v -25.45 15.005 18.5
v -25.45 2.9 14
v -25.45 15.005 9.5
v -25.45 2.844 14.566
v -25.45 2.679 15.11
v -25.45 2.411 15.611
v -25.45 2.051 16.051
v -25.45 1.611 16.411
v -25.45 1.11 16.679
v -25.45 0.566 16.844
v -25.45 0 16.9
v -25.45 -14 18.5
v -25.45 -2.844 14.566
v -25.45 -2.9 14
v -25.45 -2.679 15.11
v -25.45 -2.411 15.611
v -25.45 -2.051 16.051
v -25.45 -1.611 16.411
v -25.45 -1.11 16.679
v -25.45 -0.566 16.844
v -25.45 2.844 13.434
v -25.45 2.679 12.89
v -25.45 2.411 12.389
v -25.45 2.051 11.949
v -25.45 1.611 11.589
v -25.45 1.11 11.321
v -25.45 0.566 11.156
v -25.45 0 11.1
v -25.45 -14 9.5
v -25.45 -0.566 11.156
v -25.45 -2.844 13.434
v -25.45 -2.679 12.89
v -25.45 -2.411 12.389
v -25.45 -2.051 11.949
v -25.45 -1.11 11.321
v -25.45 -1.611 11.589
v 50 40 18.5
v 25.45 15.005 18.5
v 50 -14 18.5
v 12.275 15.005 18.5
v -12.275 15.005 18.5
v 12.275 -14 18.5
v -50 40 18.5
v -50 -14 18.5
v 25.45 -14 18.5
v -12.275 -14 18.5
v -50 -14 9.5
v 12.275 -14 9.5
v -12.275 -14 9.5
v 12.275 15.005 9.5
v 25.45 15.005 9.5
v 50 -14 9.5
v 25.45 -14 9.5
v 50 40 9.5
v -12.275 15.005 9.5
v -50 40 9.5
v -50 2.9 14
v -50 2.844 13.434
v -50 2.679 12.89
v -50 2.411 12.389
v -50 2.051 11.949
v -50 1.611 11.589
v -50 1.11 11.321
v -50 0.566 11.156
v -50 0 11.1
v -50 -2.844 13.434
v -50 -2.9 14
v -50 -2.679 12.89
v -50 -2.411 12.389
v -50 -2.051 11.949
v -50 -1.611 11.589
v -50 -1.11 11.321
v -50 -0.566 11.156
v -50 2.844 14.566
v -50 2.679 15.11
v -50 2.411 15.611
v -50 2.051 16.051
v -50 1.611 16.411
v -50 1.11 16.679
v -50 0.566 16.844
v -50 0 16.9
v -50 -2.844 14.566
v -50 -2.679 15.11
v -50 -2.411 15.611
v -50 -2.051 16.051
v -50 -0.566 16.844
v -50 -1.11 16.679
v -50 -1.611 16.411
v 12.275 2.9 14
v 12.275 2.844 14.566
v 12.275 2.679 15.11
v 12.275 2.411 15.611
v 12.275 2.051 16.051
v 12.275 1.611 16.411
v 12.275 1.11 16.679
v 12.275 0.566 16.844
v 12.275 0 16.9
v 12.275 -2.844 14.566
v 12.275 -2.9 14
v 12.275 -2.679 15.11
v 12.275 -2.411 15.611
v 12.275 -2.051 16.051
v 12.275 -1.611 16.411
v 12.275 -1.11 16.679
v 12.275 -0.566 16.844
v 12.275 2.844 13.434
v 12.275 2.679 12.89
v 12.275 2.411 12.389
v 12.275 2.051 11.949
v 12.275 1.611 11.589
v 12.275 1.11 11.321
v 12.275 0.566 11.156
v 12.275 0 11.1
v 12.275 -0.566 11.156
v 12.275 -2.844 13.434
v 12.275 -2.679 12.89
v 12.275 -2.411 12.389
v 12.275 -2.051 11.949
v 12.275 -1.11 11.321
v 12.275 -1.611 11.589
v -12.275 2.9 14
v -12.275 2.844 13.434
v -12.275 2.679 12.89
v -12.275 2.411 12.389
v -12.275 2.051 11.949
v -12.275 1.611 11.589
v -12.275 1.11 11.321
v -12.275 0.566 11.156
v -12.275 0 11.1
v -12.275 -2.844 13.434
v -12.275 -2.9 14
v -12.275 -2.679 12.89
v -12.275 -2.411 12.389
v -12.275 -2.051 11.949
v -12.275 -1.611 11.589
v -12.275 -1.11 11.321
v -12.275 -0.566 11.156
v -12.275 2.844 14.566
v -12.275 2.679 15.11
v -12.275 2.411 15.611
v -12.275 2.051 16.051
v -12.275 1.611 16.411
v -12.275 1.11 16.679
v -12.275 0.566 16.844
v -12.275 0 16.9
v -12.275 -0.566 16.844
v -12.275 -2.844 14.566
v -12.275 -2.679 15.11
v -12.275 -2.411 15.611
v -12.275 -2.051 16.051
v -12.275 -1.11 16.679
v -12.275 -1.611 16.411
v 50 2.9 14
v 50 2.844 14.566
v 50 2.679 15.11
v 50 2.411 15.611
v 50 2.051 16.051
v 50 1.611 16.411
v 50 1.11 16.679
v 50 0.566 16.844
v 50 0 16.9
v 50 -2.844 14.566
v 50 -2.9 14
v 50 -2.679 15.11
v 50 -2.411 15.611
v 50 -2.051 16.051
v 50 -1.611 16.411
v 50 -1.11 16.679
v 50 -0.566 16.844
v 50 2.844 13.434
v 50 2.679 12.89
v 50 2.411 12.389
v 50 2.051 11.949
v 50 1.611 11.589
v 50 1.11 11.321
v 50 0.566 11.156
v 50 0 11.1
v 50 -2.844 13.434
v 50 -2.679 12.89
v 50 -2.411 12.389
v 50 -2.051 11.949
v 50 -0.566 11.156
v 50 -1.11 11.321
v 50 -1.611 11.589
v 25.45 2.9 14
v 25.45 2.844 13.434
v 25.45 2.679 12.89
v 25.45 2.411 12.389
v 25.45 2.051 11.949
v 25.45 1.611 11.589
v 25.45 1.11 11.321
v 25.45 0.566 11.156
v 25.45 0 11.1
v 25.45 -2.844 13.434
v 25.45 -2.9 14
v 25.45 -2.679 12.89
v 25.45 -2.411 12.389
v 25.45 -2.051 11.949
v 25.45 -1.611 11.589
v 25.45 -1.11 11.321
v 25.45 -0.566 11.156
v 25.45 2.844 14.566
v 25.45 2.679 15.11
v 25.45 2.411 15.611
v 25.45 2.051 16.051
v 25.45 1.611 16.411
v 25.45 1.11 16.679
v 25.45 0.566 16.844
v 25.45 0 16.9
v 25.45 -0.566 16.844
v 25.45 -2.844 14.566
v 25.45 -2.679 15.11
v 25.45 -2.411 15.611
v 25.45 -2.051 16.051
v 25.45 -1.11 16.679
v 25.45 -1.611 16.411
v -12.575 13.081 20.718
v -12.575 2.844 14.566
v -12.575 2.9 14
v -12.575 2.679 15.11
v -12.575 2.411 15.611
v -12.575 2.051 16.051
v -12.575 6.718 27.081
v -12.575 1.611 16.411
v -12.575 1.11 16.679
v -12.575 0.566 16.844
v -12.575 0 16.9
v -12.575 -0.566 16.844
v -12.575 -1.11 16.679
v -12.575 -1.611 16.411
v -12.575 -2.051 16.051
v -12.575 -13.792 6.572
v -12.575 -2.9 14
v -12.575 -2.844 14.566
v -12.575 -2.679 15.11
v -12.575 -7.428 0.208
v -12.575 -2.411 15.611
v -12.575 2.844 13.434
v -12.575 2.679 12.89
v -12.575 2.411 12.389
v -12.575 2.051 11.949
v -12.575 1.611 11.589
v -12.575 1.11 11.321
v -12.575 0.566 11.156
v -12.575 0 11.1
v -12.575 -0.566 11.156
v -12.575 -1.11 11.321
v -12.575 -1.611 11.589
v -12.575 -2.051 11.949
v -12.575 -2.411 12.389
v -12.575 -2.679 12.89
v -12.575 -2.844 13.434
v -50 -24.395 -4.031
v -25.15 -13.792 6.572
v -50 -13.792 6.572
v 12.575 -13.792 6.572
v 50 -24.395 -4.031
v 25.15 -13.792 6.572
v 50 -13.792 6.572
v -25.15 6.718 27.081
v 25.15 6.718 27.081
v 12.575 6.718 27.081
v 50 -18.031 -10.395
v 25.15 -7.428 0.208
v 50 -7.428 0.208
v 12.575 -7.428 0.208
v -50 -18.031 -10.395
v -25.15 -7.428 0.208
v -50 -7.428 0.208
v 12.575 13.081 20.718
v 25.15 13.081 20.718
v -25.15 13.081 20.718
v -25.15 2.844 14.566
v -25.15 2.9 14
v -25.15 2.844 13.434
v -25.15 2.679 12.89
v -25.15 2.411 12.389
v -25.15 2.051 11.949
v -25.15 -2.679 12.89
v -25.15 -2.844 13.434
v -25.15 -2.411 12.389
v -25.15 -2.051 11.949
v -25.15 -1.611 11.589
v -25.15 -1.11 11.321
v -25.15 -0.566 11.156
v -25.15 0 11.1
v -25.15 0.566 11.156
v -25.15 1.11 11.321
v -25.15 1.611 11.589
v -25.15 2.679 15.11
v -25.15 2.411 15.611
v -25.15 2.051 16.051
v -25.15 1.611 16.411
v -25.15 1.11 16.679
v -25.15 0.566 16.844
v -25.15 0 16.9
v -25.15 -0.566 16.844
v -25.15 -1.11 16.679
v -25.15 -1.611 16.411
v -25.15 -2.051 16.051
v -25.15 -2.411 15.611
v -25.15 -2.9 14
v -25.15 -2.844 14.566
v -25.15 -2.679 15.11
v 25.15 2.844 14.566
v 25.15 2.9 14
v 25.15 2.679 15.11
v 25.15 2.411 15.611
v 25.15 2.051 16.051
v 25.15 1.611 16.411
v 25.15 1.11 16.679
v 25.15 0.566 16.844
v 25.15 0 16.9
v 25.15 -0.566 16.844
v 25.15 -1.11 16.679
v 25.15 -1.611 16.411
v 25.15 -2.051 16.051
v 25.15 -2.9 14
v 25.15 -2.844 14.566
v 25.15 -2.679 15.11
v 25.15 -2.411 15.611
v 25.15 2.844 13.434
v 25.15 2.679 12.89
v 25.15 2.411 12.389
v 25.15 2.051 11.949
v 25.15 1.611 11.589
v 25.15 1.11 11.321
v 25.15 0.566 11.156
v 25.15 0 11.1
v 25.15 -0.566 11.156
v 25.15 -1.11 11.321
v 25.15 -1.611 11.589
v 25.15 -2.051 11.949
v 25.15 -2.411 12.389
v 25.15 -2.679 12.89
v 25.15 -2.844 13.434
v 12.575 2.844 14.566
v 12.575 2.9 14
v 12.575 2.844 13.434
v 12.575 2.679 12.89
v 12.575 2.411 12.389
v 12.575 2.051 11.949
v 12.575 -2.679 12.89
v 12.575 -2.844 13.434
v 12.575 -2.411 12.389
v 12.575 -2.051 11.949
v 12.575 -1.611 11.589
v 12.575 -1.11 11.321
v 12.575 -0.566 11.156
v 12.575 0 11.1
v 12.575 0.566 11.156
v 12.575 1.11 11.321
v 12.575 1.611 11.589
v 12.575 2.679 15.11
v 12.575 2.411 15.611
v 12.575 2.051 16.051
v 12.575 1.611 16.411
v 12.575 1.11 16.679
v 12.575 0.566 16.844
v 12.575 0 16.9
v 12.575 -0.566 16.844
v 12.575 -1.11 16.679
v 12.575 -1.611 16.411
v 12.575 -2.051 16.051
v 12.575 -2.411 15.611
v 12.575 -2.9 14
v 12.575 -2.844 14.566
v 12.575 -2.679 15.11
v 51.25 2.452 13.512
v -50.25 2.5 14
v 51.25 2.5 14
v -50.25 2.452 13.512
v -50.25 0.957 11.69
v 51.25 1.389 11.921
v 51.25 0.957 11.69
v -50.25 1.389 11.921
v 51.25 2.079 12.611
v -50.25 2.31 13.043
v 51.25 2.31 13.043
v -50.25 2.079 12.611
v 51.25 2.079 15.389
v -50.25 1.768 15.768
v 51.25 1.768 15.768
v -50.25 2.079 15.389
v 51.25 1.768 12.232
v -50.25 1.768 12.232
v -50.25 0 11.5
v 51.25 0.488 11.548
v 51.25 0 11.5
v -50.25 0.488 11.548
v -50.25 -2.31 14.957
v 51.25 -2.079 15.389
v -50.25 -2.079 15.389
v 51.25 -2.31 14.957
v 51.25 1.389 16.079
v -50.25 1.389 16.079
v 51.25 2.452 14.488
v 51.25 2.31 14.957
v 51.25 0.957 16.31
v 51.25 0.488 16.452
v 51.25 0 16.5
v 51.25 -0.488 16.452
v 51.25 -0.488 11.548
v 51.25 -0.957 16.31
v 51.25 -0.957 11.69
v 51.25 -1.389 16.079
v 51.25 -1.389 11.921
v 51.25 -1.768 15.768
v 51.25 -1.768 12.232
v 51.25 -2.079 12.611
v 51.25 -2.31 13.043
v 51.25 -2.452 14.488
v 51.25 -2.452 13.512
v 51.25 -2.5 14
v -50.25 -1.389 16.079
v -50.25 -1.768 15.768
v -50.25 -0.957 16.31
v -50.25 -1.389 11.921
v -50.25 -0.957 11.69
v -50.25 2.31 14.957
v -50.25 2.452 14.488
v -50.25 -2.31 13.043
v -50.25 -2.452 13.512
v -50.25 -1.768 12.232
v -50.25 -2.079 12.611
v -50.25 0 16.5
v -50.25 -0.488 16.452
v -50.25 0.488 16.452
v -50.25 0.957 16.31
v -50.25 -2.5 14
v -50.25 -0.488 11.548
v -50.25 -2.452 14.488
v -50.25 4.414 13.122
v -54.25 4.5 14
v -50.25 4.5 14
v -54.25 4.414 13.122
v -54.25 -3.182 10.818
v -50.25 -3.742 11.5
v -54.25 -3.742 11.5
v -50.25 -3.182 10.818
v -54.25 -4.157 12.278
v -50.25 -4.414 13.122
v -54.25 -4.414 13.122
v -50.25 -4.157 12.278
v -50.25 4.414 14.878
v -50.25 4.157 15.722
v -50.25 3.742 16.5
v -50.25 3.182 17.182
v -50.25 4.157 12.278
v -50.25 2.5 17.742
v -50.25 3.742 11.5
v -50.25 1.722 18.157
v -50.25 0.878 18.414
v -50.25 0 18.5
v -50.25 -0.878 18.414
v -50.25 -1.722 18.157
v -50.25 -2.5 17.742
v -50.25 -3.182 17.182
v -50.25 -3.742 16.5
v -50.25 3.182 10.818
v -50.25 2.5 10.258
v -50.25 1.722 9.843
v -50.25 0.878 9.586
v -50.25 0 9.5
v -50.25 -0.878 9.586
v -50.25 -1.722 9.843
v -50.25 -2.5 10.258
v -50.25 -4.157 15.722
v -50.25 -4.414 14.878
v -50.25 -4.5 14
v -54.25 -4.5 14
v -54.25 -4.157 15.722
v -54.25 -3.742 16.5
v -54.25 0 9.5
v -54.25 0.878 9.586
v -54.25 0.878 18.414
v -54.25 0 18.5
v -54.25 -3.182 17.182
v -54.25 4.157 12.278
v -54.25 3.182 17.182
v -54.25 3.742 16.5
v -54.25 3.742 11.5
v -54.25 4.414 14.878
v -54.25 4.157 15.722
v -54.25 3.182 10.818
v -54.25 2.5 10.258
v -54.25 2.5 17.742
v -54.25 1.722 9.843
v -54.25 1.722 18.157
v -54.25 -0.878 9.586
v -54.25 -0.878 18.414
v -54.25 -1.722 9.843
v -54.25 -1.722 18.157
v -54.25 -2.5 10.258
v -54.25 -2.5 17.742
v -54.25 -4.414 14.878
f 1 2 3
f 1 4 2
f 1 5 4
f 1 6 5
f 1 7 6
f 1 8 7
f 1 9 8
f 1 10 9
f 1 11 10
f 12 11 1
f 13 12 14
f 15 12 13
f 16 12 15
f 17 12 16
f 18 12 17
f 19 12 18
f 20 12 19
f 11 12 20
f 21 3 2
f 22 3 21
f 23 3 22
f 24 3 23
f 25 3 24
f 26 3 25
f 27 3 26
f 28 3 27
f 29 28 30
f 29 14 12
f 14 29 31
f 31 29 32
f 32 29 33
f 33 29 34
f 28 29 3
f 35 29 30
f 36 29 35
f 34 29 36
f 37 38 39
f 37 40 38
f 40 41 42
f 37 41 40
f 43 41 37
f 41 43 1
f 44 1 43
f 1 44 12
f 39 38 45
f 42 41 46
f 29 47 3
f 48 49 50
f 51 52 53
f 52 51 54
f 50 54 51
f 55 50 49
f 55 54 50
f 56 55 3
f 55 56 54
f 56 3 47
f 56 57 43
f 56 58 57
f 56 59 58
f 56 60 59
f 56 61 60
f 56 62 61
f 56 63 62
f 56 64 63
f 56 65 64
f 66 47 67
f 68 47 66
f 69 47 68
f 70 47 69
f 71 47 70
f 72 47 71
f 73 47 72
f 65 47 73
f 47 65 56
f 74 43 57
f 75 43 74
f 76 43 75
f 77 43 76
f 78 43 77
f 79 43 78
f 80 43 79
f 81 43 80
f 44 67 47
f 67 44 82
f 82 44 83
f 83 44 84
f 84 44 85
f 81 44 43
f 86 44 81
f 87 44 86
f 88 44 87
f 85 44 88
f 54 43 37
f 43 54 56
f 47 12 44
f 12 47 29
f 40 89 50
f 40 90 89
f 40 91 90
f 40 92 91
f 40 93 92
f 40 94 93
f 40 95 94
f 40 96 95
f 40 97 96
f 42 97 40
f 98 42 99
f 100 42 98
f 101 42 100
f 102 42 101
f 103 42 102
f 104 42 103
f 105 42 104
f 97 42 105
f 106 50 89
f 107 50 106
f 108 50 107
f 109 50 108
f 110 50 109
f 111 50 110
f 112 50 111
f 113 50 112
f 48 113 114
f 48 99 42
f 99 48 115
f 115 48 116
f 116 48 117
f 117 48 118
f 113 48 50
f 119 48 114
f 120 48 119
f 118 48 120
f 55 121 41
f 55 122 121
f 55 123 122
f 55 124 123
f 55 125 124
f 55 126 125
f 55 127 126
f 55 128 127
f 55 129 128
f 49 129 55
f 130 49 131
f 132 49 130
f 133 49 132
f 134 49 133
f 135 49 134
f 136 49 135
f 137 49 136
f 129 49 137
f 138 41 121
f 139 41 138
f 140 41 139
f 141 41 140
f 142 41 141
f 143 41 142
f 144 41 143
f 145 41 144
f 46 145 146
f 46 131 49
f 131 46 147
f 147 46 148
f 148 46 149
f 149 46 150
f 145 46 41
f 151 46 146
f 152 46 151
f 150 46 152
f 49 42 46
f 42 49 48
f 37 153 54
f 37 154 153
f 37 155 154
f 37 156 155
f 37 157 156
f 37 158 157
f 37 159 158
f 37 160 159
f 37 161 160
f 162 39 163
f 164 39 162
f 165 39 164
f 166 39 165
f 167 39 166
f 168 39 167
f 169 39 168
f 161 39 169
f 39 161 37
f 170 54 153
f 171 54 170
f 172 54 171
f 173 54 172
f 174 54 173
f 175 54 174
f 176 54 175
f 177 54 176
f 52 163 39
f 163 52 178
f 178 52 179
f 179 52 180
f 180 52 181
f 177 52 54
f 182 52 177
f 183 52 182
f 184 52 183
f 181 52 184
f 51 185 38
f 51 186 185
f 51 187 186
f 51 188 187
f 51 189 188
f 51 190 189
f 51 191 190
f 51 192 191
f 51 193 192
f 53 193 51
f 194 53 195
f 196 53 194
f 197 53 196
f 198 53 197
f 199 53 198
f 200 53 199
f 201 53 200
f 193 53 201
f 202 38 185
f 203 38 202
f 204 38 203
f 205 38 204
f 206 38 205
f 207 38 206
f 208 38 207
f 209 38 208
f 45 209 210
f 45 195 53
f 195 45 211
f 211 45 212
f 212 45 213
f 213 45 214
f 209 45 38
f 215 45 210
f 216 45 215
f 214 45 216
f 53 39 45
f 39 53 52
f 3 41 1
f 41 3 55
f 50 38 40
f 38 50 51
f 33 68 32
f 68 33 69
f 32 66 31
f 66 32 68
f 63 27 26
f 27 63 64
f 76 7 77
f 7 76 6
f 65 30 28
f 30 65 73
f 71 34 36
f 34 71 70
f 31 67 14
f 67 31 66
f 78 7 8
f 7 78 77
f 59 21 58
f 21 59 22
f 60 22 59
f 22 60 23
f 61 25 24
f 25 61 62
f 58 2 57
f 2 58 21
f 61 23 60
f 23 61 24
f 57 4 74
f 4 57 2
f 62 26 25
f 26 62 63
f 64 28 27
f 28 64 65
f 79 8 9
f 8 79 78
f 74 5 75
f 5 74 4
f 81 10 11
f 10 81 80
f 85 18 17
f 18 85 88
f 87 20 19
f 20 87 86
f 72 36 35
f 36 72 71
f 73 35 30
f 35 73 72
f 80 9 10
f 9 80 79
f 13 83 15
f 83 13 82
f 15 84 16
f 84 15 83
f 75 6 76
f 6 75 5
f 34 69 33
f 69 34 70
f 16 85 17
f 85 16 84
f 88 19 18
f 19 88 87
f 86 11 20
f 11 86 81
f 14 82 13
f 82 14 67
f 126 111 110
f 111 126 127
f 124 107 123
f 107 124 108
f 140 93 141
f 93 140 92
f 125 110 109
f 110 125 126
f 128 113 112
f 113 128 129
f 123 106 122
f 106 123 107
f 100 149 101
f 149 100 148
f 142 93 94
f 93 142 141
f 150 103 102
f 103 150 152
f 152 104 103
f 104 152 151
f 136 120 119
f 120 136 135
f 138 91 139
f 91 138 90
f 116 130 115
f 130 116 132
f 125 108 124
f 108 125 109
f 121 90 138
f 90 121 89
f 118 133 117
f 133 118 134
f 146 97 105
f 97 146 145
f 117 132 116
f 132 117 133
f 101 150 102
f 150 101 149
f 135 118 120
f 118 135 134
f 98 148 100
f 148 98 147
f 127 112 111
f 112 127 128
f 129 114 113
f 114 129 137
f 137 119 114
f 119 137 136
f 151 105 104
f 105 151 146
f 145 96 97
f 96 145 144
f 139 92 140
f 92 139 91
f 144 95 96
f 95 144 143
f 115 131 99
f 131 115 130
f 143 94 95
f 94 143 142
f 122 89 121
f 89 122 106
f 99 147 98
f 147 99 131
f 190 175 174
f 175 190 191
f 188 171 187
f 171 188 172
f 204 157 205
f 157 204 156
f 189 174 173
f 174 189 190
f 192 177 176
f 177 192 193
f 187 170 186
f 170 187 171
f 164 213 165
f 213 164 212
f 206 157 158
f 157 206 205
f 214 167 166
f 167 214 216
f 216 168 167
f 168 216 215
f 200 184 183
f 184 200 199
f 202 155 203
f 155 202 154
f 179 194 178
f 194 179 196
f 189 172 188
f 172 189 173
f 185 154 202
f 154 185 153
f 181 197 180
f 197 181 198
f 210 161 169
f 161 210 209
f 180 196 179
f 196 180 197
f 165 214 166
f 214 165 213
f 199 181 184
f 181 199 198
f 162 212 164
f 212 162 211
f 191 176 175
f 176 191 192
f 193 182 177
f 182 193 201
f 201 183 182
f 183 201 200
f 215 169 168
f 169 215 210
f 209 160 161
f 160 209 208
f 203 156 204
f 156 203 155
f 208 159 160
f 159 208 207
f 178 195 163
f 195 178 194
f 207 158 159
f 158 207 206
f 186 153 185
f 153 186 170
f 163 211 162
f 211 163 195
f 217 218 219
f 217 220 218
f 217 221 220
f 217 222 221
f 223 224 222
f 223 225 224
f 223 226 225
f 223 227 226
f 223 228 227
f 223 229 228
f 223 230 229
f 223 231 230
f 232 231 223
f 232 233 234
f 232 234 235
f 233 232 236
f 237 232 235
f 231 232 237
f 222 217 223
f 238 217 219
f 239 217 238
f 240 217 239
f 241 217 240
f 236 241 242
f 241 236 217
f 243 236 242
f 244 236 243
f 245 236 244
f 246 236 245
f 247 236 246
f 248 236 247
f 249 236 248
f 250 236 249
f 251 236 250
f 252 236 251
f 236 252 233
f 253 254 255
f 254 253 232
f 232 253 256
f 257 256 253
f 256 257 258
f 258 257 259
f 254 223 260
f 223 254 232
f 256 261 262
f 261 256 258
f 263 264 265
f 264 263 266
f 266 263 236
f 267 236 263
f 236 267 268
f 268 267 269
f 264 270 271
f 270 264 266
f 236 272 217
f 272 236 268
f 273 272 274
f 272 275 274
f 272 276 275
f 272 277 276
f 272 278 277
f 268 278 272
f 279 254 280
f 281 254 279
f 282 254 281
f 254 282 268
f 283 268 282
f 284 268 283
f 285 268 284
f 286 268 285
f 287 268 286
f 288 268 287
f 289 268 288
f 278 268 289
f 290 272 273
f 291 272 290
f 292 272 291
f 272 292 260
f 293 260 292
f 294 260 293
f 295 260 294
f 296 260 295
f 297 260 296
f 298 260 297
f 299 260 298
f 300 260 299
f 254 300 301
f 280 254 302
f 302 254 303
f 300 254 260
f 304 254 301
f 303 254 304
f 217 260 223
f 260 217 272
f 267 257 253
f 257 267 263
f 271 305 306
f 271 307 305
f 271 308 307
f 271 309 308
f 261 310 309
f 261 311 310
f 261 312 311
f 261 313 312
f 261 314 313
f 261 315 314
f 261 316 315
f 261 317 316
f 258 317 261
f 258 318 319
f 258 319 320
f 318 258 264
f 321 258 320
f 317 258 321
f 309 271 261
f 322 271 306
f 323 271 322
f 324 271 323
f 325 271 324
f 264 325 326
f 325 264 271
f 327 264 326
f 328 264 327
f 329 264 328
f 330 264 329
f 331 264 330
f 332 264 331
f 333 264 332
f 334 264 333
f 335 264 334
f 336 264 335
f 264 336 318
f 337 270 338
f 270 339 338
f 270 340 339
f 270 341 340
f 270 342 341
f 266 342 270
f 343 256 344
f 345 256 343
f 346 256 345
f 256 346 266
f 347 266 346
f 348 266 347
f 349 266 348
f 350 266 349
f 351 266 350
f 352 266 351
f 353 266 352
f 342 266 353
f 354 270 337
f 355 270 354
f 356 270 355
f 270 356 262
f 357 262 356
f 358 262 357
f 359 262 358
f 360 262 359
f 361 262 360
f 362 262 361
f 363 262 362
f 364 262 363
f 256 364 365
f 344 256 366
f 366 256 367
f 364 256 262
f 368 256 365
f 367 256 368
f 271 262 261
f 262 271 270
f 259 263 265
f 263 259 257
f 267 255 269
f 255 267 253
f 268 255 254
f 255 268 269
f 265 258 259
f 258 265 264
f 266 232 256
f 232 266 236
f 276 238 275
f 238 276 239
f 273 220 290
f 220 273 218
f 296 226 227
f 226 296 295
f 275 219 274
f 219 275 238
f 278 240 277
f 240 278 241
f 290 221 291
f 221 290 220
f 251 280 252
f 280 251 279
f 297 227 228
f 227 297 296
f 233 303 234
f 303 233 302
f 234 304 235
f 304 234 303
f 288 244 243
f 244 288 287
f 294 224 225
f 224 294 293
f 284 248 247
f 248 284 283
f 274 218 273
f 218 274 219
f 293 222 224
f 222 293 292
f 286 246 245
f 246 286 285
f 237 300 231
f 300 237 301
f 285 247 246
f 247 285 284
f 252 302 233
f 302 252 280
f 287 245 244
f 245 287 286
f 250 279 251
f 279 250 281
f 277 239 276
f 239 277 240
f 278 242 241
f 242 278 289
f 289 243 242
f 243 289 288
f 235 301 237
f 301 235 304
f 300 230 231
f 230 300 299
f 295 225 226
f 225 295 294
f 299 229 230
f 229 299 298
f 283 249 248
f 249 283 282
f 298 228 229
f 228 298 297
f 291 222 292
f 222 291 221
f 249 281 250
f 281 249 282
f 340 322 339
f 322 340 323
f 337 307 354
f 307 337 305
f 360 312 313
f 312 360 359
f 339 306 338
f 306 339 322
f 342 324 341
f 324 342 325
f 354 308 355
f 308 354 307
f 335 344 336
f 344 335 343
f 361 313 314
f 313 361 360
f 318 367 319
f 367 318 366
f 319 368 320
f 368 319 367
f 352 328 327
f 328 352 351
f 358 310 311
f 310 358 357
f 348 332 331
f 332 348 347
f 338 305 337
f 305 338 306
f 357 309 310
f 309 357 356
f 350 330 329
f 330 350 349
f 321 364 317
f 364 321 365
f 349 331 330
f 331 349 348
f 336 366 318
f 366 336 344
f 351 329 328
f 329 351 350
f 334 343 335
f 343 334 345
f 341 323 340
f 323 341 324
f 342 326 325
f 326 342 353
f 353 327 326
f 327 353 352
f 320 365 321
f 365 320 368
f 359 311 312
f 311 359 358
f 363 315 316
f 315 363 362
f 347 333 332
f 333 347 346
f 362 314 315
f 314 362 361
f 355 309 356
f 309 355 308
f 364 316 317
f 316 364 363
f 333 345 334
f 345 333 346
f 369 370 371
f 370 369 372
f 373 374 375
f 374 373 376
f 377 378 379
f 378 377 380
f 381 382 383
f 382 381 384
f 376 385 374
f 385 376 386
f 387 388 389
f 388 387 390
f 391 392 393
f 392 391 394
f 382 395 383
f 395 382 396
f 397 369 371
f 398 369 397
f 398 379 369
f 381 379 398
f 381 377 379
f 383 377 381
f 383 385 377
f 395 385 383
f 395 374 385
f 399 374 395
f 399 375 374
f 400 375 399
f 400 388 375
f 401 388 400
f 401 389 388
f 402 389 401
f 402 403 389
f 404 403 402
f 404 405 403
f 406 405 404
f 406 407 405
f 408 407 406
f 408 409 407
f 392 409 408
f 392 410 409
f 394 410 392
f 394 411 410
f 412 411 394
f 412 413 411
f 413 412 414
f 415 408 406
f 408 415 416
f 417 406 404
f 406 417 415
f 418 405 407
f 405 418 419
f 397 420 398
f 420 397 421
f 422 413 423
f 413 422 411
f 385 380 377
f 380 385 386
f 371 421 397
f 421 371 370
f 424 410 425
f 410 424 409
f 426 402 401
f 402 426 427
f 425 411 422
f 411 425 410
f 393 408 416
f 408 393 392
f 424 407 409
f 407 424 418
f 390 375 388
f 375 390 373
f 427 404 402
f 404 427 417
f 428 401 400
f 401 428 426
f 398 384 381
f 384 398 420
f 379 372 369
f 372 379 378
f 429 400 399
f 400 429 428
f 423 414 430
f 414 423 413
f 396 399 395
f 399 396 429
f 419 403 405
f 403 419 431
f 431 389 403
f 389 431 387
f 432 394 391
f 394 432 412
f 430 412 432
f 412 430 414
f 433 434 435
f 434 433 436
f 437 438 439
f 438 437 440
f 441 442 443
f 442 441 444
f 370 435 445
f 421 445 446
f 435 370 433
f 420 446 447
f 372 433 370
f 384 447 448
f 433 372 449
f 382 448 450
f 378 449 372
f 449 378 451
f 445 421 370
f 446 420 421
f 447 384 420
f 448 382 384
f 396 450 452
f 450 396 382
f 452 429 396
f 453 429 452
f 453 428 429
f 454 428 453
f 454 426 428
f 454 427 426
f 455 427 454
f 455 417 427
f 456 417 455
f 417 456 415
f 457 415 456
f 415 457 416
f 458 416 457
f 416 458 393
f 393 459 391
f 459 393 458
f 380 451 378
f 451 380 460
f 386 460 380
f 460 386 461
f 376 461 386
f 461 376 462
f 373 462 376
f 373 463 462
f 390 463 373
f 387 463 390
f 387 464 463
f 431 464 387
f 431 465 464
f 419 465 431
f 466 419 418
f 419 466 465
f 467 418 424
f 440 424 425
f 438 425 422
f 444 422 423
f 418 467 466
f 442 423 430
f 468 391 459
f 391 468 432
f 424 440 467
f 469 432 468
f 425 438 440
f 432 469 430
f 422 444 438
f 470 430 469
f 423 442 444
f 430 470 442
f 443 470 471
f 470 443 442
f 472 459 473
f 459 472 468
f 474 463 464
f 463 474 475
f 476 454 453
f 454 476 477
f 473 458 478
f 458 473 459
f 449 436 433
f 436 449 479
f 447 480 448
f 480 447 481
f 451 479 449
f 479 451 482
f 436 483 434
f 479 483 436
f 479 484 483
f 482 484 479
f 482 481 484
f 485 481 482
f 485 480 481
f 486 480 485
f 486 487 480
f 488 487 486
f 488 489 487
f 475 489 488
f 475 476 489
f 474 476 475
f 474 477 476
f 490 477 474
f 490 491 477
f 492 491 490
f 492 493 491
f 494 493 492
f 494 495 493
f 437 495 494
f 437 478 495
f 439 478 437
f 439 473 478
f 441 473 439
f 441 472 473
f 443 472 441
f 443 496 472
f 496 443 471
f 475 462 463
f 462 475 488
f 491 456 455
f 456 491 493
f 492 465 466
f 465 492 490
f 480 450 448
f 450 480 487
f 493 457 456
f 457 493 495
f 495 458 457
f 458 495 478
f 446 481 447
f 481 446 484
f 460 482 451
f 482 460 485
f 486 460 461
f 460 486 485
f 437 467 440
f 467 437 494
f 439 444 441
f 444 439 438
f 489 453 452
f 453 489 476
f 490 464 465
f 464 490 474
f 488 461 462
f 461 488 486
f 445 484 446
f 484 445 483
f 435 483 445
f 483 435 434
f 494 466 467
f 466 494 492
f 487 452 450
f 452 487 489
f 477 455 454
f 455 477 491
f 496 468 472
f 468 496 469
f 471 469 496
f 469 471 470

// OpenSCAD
$fn = 32;

// ------------------------------------------------------------------------
// Butt hinge: hinge 100 mm, leaf swung 45 deg
// Every part is its own module, assembly() places every instance.
// ------------------------------------------------------------------------

// --- part 1 ---
module hinge_base() {
  difference() {
    union() {
      translate([-50, -14, -4.5]) cube([24.55, 54, 9]);
      translate([-12.275, -14, -4.5]) cube([24.55, 54, 9]);
      translate([25.45, -14, -4.5]) cube([24.55, 54, 9]);
      translate([-50, 15.005, -4.5]) cube([100, 24.995, 9]);
    }
    translate([-37.725, 0, 0]) rotate([0, 90, 0]) cylinder(h = 26.55, d = 5.8, center = true);
    translate([0, 0, 0]) rotate([0, 90, 0]) cylinder(h = 26.55, d = 5.8, center = true);
    translate([37.725, 0, 0]) rotate([0, 90, 0]) cylinder(h = 26.55, d = 5.8, center = true);
  }
}

// --- part 2 ---
module hinge_mover() {
  difference() {
    union() {
      translate([-25.15, -30, -4.5]) cube([12.575, 44, 9]);
      translate([12.575, -30, -4.5]) cube([12.575, 44, 9]);
      translate([-50, -30, -4.5]) cube([100, 14.995, 9]);
    }
    translate([-18.863, 0, 0]) rotate([0, 90, 0]) cylinder(h = 14.575, d = 5.8, center = true);
    translate([18.863, 0, 0]) rotate([0, 90, 0]) cylinder(h = 14.575, d = 5.8, center = true);
  }
}

// --- part 3 ---
module hinge_pin() {
  rotate([0, 90, 0]) cylinder(h = 102.5, d = 5, center = true);
  translate([-54.25, 0, 0]) rotate([0, 90, 0]) cylinder(h = 4, d = 9);
}

// --- assembly ---
module assembly() {
  color([0.80, 0.24, 0.20]) translate([0, 0, 14]) rotate([0, 0, 0]) hinge_base();
  color([0.20, 0.45, 0.75]) translate([0, 0, 14]) rotate([45, 0, 0]) hinge_mover();
  color([0.25, 0.62, 0.32]) translate([0, 0, 14]) rotate([0, 0, 0]) hinge_pin();
}

assembly();
